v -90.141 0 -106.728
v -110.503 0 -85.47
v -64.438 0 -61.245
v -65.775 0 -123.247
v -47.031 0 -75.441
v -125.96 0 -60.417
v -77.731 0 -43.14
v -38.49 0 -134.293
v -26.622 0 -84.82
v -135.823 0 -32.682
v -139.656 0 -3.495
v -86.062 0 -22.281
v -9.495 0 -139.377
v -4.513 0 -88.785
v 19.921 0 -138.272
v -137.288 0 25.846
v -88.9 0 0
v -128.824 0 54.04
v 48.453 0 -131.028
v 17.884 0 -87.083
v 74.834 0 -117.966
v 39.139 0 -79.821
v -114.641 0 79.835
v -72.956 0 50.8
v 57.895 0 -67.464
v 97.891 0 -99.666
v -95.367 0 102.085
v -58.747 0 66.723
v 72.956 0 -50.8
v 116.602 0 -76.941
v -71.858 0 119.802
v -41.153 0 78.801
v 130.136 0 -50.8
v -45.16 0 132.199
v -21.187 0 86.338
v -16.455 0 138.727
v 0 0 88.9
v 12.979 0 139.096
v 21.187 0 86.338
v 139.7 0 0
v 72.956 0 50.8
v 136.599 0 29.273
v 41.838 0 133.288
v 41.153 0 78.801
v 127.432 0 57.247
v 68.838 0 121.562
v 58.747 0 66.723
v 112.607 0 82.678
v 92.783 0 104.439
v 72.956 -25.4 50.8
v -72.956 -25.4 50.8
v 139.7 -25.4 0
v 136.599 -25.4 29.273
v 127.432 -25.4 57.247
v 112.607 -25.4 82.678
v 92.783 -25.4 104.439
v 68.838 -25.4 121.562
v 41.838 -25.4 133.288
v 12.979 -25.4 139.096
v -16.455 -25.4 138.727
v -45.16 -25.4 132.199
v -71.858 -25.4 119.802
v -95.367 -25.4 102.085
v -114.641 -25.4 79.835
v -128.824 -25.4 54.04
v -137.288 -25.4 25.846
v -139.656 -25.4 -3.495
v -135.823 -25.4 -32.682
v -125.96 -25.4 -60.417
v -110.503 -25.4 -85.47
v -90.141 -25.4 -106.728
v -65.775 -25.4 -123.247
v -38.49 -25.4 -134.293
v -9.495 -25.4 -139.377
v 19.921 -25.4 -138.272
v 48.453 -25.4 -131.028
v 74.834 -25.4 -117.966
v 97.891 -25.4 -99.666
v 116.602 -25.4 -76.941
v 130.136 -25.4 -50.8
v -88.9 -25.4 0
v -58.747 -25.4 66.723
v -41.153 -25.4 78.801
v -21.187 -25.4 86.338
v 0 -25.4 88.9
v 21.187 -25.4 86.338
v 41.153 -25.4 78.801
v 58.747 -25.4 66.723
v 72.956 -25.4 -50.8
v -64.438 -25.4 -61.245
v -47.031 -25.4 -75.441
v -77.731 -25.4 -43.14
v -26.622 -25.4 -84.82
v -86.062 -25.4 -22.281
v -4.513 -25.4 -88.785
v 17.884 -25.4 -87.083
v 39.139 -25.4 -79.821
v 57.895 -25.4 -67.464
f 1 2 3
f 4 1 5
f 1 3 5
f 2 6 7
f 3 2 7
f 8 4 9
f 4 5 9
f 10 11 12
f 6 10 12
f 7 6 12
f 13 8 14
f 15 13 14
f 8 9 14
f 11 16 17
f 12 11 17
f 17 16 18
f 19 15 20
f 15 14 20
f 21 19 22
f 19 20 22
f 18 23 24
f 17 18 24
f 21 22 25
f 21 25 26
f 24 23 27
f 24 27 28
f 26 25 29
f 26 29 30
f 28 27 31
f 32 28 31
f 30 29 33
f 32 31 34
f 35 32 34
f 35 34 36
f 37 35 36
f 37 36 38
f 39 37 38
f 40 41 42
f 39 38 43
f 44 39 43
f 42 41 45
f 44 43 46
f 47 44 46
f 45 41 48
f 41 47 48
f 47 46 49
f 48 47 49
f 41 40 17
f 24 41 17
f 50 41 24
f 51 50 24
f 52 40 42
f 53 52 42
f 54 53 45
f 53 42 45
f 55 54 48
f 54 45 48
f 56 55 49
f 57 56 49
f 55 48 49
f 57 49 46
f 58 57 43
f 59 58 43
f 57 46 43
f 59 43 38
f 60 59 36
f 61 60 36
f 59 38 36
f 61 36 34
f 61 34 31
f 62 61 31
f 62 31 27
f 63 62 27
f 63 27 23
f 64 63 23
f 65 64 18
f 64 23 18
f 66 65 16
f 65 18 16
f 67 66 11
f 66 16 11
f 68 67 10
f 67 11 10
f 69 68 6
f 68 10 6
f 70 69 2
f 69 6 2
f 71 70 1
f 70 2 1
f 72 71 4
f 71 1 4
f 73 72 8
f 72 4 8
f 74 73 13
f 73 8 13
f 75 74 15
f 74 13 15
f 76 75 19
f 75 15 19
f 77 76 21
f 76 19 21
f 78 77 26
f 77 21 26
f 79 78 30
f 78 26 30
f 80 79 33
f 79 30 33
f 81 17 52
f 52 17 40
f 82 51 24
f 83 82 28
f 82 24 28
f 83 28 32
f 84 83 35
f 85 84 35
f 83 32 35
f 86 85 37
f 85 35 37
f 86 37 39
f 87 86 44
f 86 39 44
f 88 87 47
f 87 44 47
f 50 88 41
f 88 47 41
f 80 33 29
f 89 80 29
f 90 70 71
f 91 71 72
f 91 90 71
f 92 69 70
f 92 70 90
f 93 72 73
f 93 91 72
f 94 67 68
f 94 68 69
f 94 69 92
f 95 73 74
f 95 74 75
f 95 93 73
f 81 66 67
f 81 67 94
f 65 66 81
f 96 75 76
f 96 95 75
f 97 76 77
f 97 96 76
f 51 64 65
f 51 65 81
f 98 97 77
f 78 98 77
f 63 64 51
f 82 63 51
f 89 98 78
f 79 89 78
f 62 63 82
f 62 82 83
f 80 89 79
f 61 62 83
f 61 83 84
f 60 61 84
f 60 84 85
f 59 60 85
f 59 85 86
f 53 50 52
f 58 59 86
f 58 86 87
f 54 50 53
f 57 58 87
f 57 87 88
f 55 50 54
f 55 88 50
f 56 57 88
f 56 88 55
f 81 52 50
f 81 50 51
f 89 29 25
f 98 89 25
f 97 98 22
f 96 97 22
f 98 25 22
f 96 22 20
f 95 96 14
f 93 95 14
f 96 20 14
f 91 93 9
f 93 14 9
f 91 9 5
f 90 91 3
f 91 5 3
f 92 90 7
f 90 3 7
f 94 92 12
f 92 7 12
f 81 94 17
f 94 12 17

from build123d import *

# Parameters (mm, degrees)
F1_DEPTH = 25.4


with BuildPart() as f1:
    # F0 (on Front) → F1 (new body)
    with BuildSketch(Plane.XZ):
        with BuildLine():
            Line((88.9, 0), (139.7, 0))
            ThreePointArc((139.7, 0), (-137.288251, 25.846203), (130.136275, -50.8))
            Line((130.136275, -50.8), (72.955946, -50.8))
            ThreePointArc((72.955946, -50.8), (-26.621668, -84.82038), (-88.9, 0))
            Line((-88.9, 0), (88.9, 0))
        make_face()
        with BuildLine():
            ThreePointArc((-72.955946, 50.8), (0, 88.9), (72.955946, 50.8))
            Line((72.955946, 50.8), (-72.955946, 50.8))
        make_face(mode=Mode.SUBTRACT)
    extrude(amount=F1_DEPTH)


solid = f1.part
